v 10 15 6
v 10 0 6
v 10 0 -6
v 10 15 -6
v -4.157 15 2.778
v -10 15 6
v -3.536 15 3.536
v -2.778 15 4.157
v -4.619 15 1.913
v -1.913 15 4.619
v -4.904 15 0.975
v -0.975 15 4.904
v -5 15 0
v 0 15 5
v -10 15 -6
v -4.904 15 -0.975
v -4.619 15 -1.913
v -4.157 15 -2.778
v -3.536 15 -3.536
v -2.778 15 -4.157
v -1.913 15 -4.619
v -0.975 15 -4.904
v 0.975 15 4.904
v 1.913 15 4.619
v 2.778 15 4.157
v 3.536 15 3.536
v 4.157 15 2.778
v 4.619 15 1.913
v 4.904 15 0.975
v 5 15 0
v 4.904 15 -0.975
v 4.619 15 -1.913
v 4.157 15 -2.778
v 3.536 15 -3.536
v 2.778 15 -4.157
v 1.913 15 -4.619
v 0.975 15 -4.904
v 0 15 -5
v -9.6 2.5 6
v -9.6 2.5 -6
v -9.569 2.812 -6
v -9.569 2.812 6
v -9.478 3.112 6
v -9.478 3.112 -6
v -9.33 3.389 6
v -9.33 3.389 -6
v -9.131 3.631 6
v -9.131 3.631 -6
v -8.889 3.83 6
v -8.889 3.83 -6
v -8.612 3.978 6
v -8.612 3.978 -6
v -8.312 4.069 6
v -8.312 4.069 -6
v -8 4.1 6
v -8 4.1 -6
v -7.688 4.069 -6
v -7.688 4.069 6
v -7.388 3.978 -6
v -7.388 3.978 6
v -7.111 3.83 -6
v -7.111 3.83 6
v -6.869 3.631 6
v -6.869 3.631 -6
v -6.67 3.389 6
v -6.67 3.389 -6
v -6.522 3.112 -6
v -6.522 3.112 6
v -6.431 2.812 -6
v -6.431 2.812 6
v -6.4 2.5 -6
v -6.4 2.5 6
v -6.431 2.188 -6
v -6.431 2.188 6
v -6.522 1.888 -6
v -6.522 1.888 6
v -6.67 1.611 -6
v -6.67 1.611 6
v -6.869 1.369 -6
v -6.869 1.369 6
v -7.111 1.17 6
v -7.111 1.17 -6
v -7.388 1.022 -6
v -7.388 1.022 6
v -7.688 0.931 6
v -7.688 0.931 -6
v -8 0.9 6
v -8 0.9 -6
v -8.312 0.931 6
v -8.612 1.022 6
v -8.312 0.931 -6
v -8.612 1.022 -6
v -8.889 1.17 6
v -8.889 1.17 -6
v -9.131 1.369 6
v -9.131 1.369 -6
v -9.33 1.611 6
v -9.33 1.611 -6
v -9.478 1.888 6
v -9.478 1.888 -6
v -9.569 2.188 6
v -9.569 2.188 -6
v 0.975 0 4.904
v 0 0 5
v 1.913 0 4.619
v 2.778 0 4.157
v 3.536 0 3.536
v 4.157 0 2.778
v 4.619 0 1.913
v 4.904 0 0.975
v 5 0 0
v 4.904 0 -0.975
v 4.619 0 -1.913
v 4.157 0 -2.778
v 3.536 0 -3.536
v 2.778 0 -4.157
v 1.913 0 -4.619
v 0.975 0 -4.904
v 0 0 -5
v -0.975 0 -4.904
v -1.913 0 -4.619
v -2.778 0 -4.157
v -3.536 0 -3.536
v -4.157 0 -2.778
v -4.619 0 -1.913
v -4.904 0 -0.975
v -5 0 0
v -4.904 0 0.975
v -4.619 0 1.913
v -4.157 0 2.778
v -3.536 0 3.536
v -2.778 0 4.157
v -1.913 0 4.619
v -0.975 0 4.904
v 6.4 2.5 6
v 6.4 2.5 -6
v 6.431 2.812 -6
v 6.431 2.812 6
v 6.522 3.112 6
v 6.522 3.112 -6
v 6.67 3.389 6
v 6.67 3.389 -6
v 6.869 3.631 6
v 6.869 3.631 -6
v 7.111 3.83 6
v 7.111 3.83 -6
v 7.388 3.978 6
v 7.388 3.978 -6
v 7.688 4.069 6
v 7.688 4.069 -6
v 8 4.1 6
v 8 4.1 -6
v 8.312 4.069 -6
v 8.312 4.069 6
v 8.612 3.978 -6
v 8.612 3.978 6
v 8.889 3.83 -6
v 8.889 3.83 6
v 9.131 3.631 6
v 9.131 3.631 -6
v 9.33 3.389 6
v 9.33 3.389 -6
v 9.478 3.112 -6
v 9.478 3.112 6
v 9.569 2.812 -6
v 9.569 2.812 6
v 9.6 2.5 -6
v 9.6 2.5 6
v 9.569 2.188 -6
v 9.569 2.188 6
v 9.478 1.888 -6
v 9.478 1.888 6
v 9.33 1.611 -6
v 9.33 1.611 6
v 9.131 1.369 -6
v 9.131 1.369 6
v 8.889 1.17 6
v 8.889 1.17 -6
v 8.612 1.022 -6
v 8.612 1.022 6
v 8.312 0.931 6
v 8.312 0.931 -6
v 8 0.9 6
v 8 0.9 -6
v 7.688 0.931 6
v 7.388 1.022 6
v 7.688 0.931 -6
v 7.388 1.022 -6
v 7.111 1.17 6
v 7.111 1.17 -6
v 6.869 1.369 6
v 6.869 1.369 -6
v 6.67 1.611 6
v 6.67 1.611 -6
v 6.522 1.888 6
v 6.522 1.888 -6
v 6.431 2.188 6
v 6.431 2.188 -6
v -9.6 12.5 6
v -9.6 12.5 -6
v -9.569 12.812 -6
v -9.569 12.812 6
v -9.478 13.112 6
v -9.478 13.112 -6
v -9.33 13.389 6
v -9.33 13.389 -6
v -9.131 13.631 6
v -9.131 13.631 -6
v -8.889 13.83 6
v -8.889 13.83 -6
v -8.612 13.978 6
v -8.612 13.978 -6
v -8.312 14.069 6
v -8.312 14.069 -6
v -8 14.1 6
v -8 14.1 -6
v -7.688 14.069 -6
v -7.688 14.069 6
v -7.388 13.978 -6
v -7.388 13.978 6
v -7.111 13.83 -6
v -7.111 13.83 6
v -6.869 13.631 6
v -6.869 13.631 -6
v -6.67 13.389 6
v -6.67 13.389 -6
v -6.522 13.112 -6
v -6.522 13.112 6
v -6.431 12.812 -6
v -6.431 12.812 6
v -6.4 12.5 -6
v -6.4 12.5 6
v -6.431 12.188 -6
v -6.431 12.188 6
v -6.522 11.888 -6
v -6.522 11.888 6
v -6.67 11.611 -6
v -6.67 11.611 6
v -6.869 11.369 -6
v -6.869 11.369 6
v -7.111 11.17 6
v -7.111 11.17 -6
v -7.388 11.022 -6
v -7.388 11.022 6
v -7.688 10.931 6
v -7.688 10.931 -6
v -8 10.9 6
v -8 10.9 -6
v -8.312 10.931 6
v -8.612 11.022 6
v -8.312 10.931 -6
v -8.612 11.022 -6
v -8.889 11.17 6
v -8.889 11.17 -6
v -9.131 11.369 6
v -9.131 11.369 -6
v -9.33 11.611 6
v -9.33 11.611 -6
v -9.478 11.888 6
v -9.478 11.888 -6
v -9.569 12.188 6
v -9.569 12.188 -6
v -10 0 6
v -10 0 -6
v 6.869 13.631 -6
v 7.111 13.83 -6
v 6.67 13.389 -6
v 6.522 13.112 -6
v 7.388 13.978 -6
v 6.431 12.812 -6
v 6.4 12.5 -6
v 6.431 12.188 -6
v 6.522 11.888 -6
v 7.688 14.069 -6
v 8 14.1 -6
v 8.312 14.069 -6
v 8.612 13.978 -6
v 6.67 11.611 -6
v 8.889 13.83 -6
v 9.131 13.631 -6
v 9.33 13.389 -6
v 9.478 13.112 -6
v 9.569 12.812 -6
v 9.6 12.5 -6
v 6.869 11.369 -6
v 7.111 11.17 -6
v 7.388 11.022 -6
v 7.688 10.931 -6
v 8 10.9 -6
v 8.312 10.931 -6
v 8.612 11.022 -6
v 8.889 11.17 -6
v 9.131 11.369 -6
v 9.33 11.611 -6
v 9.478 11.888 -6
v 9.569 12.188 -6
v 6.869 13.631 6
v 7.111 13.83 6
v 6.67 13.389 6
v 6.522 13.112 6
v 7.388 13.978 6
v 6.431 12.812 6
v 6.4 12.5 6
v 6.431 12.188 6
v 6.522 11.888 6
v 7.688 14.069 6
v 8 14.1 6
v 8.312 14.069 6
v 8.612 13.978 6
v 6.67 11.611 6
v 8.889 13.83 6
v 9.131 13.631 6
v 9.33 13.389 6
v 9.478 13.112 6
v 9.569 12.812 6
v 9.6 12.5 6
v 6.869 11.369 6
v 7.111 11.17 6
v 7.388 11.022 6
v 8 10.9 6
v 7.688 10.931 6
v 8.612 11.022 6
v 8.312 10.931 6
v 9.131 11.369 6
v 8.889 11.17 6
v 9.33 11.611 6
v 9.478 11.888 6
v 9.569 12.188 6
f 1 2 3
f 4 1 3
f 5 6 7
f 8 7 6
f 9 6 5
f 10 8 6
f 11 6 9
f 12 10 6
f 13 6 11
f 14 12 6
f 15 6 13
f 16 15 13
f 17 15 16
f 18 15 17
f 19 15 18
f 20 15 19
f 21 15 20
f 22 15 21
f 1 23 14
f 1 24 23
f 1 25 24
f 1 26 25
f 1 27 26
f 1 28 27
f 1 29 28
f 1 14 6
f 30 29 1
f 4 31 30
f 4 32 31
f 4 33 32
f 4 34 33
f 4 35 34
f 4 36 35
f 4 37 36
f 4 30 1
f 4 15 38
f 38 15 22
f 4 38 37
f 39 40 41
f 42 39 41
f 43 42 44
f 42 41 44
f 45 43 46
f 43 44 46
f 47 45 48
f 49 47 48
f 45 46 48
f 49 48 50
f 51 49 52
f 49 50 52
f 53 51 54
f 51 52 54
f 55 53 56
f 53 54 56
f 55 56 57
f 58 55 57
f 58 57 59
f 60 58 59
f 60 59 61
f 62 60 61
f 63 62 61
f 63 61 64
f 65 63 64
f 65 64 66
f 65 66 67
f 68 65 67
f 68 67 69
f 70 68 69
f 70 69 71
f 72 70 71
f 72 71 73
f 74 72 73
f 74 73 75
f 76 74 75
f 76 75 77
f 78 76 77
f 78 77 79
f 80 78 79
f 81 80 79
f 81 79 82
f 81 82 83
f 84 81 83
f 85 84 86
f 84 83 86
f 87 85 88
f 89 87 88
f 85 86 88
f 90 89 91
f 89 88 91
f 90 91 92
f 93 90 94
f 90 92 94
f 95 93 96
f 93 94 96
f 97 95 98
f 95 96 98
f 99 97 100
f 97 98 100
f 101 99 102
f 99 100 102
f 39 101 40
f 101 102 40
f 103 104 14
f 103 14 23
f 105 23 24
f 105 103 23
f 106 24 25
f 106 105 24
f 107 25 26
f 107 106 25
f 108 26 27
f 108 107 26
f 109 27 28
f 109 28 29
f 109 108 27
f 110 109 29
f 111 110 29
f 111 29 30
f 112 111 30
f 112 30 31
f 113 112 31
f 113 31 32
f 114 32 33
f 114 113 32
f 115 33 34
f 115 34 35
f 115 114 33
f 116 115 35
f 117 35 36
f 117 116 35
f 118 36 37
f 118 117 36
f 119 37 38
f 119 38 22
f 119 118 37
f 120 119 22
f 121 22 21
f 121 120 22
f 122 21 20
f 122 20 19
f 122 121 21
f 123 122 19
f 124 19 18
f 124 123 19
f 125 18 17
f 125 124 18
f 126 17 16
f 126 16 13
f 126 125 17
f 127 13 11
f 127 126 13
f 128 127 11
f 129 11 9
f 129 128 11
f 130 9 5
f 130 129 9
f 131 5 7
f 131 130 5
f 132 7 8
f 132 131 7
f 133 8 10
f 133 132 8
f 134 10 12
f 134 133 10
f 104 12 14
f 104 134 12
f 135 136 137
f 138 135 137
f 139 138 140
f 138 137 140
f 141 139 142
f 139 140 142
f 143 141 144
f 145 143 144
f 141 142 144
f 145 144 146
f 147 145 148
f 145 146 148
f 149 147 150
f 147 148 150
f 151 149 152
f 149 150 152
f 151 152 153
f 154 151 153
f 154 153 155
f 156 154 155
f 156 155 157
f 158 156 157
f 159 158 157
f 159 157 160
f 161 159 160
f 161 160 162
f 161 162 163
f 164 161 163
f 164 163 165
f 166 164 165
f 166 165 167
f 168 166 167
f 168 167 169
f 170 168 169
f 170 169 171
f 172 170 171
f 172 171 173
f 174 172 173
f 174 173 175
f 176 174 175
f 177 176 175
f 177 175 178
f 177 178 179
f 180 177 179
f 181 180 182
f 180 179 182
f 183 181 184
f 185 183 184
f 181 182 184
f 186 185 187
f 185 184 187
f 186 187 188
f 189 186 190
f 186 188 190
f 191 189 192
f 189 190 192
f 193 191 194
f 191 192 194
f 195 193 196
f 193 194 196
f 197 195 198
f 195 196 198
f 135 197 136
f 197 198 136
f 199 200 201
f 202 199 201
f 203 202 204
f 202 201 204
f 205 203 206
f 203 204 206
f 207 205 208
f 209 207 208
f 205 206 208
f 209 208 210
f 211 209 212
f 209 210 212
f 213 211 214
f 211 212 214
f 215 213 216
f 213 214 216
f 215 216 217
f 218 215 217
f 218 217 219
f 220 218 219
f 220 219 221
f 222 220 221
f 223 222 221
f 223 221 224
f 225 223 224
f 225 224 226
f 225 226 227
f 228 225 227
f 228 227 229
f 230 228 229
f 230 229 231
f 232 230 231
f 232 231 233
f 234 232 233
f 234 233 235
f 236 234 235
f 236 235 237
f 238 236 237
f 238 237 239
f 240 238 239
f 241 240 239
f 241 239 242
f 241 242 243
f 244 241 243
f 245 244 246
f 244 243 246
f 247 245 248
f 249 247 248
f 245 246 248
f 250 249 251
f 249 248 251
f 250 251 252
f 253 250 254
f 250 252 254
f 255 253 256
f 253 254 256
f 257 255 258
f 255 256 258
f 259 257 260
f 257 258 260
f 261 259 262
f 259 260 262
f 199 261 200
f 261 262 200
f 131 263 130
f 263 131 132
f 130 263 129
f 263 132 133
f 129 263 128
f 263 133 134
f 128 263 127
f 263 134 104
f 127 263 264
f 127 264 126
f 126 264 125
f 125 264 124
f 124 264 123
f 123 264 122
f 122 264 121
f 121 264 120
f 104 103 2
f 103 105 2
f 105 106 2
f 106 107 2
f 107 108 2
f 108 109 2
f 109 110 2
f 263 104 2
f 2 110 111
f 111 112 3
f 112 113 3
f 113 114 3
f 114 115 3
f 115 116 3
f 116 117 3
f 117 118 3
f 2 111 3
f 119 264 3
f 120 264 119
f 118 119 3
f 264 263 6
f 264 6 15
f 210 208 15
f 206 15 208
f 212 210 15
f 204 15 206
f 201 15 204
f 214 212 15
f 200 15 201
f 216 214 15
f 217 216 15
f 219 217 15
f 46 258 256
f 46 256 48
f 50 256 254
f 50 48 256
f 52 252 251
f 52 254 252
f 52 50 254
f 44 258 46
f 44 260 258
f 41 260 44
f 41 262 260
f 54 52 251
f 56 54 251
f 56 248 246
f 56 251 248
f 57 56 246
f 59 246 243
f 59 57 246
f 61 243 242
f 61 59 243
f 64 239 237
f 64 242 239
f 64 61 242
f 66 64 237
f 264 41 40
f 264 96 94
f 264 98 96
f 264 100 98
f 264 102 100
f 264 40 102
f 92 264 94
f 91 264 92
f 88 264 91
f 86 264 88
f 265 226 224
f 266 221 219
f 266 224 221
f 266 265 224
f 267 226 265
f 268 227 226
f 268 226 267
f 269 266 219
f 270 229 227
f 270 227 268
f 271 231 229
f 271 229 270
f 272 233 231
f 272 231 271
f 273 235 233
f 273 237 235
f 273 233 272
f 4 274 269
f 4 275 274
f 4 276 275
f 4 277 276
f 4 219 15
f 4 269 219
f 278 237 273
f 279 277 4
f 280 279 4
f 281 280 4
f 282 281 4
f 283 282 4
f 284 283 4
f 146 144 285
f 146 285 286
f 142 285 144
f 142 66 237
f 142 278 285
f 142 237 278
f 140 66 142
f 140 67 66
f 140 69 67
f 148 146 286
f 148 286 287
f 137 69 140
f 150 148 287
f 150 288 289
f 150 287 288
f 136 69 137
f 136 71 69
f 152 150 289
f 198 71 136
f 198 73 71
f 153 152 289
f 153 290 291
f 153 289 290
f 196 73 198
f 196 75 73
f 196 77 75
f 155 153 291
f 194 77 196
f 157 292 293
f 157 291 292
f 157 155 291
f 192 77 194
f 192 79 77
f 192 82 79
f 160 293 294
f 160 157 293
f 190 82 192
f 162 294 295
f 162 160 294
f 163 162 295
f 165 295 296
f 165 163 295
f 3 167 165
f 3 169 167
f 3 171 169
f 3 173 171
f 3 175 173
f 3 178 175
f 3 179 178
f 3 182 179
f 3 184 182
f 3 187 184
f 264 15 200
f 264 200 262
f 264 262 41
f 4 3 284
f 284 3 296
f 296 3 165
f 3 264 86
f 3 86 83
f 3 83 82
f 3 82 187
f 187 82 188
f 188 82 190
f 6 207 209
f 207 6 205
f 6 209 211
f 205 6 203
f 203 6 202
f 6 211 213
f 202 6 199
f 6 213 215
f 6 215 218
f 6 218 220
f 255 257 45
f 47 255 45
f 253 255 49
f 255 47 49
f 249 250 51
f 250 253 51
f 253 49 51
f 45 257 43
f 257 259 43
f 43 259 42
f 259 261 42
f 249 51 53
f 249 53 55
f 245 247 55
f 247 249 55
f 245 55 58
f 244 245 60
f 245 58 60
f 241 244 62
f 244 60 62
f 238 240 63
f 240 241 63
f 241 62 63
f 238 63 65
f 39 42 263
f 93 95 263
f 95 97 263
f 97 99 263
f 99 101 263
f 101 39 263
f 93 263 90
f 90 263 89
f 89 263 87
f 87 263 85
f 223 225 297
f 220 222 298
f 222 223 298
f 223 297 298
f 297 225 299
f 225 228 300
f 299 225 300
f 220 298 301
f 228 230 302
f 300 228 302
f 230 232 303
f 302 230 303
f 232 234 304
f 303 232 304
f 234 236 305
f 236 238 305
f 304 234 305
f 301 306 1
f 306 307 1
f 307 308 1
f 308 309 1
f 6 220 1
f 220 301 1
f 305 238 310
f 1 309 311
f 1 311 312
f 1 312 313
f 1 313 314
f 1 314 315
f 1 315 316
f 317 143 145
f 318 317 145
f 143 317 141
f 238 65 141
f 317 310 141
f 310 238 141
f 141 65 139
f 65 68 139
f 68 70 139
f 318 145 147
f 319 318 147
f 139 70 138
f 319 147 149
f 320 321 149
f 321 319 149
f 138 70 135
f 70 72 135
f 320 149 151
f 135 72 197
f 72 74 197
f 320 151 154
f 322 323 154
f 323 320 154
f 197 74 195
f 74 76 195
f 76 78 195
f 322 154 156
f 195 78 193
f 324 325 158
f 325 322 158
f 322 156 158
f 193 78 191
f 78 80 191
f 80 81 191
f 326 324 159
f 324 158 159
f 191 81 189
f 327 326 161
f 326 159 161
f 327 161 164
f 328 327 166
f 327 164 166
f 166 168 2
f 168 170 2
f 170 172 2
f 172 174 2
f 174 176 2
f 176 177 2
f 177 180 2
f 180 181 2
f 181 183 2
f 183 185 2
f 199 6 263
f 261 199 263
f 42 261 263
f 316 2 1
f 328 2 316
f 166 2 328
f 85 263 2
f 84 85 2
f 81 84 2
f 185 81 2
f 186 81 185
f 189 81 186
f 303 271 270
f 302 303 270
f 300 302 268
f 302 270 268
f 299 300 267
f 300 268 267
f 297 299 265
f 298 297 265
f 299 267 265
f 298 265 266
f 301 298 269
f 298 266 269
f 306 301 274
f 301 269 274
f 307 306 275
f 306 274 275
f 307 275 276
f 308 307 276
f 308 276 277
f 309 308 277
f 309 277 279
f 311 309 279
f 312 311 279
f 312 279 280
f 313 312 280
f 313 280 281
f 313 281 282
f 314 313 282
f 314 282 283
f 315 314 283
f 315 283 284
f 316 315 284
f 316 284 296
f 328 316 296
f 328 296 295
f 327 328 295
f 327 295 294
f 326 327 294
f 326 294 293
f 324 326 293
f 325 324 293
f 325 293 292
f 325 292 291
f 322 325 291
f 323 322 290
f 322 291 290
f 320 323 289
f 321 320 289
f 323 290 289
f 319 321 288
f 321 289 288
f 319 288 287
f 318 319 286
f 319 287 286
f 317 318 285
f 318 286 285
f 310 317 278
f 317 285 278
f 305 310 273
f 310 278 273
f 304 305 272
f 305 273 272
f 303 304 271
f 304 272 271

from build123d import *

# Parameters (mm, degrees)
SZKIC1_W                    = 20
SZKIC1_H                    = 12
SZKIC1_R                    = 5
DODANIE_WYCI_GNI_CIE1_DEPTH = 15
OTW_R_3_2_3_2_1_D           = 3.2


with BuildPart() as part:
    # Szkic1 → Dodanie-wyciągnięcie1 (new body)
    with BuildSketch(Plane(origin=(0, 0, 0), x_dir=(1, 0, 0), z_dir=(0, 1, 0))):
        Rectangle(SZKIC1_W, SZKIC1_H)
        with Locations(Location((0, 0, 0), (0, 0, 270))):
            Circle(SZKIC1_R, mode=Mode.SUBTRACT)
    extrude(amount=DODANIE_WYCI_GNI_CIE1_DEPTH)

    # Otwór Ø3.2 (3.2)1 (through all)
    with Locations(Plane.XY.offset(6)):
        with Locations((8, 12.5), (-8, 12.5), (-8, 2.5), (8, 2.5)):
            Hole(OTW_R_3_2_3_2_1_D / 2)


solid = part.part
